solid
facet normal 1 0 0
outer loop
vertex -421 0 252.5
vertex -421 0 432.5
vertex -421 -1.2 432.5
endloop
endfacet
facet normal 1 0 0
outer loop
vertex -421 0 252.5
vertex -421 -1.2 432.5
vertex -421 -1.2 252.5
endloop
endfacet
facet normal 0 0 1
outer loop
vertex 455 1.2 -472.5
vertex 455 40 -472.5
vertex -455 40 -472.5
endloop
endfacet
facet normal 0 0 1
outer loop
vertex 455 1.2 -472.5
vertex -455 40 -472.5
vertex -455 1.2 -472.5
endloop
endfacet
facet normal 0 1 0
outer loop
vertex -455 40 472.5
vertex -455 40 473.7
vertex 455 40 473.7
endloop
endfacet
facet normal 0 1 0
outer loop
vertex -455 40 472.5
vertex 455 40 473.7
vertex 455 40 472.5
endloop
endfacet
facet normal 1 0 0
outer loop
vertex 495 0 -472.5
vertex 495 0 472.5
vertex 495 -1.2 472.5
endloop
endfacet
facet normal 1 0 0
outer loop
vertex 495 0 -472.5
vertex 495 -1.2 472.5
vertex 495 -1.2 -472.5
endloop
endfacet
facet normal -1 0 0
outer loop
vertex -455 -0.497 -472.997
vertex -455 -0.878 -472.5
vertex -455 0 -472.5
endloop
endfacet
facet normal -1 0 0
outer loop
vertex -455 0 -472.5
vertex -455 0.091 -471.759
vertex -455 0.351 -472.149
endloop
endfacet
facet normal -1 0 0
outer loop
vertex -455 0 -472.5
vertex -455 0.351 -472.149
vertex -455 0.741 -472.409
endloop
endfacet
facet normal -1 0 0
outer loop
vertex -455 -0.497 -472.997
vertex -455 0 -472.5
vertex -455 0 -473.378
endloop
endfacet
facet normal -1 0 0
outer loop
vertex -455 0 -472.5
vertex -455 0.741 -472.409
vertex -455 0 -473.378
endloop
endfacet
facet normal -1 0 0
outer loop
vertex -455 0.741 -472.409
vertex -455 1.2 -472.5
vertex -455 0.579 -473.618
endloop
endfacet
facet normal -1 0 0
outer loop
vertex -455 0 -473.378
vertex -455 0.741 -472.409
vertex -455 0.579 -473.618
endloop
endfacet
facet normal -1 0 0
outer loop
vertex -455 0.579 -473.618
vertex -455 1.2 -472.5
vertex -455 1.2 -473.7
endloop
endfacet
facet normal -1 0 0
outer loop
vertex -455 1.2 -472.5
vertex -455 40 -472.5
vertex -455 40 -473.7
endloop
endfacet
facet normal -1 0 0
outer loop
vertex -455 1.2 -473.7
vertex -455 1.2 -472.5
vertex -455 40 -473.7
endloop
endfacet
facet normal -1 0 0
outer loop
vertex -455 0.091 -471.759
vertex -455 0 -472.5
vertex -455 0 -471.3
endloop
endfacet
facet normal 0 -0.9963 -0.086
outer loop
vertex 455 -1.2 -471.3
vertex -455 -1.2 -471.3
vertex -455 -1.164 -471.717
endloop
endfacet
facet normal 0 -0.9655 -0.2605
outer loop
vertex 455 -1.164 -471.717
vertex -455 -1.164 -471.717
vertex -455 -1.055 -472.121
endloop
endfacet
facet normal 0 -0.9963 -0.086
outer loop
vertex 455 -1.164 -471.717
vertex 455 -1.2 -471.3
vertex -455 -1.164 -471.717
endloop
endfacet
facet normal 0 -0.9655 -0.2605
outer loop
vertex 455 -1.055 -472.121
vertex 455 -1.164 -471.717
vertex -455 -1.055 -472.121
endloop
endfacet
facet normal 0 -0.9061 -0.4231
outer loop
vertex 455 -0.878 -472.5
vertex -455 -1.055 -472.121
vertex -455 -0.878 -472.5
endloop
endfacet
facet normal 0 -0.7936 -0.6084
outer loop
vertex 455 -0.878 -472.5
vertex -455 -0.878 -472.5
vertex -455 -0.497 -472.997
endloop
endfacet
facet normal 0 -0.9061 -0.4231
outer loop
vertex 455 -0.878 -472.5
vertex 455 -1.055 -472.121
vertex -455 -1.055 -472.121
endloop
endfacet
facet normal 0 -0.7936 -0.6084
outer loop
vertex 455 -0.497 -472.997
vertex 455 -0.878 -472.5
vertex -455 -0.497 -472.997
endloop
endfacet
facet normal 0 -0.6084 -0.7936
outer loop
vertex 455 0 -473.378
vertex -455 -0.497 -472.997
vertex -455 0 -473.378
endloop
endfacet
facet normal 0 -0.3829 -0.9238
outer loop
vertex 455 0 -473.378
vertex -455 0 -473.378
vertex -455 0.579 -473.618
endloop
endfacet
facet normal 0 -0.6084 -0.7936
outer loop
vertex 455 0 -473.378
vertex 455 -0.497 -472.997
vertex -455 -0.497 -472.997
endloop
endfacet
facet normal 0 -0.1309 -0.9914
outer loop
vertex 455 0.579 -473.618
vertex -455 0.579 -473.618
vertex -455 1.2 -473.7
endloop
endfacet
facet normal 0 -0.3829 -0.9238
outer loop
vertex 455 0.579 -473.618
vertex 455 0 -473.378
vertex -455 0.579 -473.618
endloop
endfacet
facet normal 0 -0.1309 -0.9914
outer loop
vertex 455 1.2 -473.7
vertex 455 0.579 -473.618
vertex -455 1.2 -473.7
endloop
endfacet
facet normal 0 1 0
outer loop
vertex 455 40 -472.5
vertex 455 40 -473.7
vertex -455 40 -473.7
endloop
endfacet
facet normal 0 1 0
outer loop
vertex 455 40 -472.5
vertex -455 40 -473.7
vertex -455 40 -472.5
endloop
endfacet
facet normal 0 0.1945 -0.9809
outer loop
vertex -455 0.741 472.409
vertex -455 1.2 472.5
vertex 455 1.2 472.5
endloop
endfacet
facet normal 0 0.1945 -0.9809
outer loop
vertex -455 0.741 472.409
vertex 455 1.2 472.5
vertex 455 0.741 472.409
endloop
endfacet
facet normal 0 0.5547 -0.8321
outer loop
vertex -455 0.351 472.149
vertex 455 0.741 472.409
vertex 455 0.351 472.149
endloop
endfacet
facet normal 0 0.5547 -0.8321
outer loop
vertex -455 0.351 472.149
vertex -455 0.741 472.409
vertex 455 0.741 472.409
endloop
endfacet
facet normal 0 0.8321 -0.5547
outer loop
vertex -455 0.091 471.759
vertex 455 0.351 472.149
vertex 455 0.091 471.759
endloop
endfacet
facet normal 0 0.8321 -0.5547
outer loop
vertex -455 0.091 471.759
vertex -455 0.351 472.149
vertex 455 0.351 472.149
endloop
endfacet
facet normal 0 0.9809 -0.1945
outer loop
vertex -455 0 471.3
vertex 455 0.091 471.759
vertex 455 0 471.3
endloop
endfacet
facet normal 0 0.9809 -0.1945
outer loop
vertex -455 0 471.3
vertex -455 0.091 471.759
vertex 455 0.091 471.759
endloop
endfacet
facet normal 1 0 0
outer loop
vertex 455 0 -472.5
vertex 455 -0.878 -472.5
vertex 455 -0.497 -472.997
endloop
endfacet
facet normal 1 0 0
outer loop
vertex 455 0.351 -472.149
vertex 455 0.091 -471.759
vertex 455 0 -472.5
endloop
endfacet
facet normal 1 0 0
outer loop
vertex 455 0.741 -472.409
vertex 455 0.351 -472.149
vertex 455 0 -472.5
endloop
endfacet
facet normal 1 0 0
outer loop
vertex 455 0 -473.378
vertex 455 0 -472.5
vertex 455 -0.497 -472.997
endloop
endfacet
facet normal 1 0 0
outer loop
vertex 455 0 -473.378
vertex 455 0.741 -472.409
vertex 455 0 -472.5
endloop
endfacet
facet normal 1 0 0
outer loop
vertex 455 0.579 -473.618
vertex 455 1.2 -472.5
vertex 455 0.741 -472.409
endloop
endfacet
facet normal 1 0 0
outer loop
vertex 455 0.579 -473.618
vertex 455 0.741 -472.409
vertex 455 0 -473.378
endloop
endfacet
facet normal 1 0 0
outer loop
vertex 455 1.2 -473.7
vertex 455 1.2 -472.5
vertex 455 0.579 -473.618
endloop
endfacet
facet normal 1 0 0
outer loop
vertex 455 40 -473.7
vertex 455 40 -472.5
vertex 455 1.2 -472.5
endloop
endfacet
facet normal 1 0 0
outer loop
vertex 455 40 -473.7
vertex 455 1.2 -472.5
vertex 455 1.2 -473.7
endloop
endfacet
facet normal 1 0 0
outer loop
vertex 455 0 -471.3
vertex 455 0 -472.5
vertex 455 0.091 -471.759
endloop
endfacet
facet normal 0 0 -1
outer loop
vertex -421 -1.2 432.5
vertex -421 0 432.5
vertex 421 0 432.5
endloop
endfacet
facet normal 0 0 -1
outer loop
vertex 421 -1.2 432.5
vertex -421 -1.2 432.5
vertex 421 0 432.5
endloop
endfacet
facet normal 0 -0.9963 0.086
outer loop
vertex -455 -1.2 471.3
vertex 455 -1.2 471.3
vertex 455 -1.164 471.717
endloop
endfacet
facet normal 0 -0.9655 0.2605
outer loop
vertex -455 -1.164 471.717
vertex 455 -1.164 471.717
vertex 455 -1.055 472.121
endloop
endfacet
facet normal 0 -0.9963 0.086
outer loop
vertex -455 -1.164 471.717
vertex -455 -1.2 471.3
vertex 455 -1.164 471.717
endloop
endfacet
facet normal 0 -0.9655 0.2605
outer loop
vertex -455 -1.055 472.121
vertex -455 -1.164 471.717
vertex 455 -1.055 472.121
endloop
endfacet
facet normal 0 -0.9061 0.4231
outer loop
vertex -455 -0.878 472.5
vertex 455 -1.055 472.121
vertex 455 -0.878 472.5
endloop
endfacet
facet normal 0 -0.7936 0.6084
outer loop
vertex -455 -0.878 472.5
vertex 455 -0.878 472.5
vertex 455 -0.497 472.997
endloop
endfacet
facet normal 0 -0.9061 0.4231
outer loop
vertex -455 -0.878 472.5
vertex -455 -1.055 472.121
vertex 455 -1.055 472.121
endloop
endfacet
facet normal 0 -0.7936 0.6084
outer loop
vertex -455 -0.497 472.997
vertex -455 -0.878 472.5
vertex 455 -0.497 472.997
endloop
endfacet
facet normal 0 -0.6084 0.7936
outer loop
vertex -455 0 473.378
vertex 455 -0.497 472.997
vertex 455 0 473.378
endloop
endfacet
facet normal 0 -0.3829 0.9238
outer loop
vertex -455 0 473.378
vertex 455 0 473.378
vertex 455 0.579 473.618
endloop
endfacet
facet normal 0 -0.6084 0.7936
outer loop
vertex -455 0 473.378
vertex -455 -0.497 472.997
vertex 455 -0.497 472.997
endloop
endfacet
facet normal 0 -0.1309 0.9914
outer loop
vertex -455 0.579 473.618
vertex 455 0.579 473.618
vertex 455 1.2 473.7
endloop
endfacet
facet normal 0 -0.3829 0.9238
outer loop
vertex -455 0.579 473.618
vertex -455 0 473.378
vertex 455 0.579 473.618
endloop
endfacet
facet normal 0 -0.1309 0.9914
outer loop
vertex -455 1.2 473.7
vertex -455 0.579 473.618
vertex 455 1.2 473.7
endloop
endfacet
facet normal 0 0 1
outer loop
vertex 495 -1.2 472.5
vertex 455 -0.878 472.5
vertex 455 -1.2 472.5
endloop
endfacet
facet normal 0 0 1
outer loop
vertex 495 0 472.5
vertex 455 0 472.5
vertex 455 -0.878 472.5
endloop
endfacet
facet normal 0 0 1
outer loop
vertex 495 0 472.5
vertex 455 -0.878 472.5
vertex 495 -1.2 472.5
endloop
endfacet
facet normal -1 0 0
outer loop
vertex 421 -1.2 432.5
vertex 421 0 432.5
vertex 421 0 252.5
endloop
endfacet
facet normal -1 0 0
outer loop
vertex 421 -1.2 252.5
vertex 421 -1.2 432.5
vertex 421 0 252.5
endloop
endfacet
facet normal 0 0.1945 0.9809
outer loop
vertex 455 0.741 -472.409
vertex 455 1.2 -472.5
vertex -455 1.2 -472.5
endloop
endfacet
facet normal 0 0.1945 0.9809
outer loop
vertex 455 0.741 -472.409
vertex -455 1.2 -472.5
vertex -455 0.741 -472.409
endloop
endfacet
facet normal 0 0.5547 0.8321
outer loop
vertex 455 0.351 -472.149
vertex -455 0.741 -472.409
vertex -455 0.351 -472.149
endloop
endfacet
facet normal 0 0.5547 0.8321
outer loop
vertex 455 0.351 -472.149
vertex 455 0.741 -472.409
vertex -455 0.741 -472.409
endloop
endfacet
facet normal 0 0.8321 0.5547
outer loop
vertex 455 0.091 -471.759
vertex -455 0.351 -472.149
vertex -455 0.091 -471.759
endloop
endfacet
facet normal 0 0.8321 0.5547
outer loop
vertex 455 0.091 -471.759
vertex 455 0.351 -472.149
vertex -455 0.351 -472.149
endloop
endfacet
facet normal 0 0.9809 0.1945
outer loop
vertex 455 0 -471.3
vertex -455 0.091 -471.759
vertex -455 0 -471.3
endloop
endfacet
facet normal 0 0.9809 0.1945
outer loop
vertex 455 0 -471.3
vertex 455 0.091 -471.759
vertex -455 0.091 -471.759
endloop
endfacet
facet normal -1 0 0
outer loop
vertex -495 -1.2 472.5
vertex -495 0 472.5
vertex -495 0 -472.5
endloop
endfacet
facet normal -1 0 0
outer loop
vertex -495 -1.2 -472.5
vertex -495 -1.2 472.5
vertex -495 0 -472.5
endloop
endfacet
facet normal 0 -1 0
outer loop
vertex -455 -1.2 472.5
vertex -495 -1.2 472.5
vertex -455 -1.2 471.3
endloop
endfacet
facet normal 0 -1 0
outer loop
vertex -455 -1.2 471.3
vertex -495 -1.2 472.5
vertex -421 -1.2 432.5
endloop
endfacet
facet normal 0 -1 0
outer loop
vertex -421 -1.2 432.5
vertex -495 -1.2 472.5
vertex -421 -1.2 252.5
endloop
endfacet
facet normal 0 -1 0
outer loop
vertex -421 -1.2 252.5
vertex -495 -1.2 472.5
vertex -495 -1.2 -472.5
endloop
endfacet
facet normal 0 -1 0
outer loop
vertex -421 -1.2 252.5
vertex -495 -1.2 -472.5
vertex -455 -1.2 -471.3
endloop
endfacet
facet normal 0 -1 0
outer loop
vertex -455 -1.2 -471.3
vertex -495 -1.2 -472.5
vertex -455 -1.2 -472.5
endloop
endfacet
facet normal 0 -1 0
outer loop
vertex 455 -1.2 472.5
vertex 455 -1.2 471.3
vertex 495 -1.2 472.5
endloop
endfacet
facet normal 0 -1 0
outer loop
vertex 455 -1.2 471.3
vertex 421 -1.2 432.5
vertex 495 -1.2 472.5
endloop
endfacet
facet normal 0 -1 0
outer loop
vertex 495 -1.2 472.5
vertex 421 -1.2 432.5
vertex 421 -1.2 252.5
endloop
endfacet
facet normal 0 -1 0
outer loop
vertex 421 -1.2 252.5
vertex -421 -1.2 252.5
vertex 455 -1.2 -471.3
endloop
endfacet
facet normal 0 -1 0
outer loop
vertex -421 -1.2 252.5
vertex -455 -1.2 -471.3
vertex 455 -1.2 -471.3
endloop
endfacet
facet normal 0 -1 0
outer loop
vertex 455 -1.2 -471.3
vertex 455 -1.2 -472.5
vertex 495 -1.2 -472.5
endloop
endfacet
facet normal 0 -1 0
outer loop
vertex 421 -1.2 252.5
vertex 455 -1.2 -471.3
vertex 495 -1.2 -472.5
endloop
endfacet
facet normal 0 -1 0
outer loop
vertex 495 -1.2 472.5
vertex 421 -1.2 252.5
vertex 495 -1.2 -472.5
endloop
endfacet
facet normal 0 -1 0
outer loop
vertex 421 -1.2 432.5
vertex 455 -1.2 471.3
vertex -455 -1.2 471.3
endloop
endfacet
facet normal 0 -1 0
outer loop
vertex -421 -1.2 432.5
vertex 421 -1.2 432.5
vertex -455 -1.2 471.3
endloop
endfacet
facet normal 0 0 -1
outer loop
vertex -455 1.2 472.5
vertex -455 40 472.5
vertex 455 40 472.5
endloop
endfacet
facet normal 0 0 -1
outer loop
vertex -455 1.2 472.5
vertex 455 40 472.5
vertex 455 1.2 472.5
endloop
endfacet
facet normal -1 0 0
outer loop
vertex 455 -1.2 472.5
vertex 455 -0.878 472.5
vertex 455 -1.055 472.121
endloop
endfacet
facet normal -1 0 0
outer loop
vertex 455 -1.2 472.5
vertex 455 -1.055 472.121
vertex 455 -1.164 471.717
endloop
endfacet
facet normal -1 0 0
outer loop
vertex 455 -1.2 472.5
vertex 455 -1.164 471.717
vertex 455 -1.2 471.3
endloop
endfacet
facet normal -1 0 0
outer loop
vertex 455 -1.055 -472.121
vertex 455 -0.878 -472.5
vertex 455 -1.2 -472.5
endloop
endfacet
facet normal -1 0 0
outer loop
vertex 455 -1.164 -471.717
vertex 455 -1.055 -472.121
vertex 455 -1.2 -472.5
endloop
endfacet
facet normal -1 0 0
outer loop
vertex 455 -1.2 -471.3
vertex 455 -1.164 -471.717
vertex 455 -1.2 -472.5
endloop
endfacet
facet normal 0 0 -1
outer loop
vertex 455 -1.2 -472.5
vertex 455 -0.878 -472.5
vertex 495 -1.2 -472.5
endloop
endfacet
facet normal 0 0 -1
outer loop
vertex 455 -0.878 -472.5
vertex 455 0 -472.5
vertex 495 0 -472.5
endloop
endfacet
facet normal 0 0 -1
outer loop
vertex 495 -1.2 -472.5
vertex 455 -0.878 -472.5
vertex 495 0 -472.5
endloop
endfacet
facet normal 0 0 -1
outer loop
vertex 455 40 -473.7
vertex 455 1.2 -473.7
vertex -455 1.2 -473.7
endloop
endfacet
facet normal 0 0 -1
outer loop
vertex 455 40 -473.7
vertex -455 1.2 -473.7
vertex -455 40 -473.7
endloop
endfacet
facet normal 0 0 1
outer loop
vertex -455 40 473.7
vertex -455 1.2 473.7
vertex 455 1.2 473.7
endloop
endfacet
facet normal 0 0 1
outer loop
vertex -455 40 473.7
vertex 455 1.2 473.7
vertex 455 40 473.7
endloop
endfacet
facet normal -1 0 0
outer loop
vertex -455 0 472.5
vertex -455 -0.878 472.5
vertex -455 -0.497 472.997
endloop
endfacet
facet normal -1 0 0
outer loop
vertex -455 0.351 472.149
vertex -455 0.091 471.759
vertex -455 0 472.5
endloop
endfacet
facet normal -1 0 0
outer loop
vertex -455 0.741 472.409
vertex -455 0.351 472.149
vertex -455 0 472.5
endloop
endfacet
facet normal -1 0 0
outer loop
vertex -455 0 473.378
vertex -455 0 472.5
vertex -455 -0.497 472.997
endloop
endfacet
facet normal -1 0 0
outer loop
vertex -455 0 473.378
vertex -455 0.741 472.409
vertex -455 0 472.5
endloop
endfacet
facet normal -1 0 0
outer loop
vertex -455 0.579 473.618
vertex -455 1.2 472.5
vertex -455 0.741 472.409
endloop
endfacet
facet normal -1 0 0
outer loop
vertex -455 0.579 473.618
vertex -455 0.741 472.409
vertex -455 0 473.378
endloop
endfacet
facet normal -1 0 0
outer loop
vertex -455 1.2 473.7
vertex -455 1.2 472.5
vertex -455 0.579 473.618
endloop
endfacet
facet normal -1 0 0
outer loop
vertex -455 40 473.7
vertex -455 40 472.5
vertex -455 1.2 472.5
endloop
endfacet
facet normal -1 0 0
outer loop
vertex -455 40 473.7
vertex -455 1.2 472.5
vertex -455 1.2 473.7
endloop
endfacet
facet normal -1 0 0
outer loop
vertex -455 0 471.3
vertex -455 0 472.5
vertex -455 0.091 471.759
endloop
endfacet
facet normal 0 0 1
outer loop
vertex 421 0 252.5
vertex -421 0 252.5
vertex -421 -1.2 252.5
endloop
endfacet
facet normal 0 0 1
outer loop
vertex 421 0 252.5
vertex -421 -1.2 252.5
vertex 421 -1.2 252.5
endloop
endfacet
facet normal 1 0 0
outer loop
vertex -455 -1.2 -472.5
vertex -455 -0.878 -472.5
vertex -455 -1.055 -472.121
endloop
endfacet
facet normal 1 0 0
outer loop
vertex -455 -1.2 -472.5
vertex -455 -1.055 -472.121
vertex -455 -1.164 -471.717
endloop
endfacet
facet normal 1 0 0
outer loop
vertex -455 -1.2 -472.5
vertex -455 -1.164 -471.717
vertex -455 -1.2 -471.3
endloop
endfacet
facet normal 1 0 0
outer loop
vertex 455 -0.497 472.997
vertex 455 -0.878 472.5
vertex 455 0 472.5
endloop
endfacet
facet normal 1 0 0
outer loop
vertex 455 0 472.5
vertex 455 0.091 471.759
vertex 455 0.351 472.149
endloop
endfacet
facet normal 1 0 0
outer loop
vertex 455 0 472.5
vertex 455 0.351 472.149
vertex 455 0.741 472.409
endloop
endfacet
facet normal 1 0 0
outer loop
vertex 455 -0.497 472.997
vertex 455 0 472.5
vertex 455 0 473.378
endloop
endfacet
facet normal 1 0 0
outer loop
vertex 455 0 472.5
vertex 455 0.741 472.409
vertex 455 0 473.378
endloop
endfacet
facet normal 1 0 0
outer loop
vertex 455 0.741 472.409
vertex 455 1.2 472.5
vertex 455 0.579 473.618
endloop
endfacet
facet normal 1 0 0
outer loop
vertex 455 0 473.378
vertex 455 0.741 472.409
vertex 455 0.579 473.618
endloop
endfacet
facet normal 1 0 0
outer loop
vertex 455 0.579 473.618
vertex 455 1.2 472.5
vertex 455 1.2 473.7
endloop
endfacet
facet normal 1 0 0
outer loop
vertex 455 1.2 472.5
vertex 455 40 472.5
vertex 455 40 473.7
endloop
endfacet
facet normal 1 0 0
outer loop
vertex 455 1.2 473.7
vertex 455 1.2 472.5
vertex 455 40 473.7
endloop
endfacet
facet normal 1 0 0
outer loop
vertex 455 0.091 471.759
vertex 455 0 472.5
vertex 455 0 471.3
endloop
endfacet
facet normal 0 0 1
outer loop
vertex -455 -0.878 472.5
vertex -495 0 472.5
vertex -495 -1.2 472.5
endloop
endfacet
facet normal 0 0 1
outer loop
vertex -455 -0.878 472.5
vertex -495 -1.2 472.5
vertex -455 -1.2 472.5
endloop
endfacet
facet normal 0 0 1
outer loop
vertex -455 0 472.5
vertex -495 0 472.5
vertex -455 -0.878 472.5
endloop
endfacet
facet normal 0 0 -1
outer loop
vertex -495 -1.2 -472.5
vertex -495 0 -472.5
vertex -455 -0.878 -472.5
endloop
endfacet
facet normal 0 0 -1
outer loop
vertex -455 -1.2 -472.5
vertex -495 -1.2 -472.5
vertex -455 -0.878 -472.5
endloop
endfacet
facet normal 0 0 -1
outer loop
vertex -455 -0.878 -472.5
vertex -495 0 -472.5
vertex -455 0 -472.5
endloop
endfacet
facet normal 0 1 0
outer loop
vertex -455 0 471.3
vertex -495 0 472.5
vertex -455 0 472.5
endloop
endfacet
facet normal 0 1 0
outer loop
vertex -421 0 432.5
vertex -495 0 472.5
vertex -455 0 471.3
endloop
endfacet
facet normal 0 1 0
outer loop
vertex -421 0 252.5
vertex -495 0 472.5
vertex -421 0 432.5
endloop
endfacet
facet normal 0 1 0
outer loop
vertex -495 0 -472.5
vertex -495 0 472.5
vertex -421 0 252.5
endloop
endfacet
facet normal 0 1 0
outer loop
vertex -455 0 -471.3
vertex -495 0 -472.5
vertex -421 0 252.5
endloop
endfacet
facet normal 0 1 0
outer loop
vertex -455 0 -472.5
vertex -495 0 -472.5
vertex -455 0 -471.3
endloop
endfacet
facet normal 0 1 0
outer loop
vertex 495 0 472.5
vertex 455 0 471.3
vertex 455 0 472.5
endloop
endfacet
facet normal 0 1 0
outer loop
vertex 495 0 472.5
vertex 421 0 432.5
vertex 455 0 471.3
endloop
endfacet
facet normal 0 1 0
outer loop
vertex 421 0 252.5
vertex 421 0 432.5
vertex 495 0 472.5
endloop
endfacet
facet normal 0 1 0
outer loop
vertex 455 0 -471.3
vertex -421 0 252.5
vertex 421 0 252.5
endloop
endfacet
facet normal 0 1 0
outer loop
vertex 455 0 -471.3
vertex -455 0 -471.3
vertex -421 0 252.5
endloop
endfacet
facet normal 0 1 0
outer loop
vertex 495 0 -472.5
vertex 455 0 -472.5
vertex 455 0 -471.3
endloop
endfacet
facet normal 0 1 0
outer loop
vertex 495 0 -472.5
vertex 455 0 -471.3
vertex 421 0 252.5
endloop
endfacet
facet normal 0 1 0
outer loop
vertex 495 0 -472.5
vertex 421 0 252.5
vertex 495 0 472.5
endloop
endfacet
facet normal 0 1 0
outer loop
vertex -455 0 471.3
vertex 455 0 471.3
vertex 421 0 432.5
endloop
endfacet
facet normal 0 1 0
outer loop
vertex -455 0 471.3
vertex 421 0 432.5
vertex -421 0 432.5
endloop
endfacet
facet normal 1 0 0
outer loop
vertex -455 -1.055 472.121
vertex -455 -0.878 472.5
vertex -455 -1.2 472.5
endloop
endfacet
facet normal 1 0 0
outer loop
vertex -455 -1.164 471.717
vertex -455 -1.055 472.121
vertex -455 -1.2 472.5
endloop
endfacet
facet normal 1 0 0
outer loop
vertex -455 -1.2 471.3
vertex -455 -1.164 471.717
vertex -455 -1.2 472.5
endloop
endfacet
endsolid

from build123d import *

# Parameters (mm, degrees)
SKETCH1_W                    = 990
SKETCH1_H                    = 945
SKETCH1_W_2                  = 842
SKETCH1_H_2                  = 180
BASE_FLANGE1_DEPTH           = 1.2
EDGE_FLANGE1_STRIP_W         = 7.2
EDGE_FLANGE1_STRIP_H         = 1.2
EDGE_FLANGE1_STRIP_CUT_DEPTH = 910
EDGE_FLANGE1_DEPTH           = 910
EDGE_FLANGE2_STRIP_W         = 7.2
EDGE_FLANGE2_STRIP_H         = 1.2
EDGE_FLANGE2_STRIP_CUT_DEPTH = 910
EDGE_FLANGE2_DEPTH           = 910


# Sheet-metal steps are written as plain solids
with BuildPart() as part:
    # Sketch1 → Base-Flange1 (new body)
    with BuildSketch(Plane(origin=(0, 0, 0), x_dir=(1, 0, 0), z_dir=(0, 1, 0))):
        Rectangle(SKETCH1_W, SKETCH1_H)
        with Locations((0, -342.5)):
            Rectangle(SKETCH1_W_2, SKETCH1_H_2, mode=Mode.SUBTRACT)
    extrude(amount=-BASE_FLANGE1_DEPTH)

    # Edge-Flange1 strip (across the edge) → Edge-Flange1 strip cut (cut)
    with BuildSketch(Plane(origin=(455, 0, -472.5), x_dir=(0, 0, 1), z_dir=(-1, 0, 0))):
        with Locations((-2.4, -0.6)):
            Rectangle(EDGE_FLANGE1_STRIP_W, EDGE_FLANGE1_STRIP_H)
    extrude(amount=EDGE_FLANGE1_STRIP_CUT_DEPTH, mode=Mode.SUBTRACT)

    # Edge-Flange1 section (across the edge) → Edge-Flange1 (add)
    with BuildSketch(Plane(origin=(455, 0, -472.5), x_dir=(0, 0, 1), z_dir=(-1, 0, 0))):
        with BuildLine():
            Line((-1.2, 1.2), (-1.2, 40))
            Line((-1.2, 40), (0, 40))
            Line((0, 40), (0, 1.2))
            ThreePointArc((0, 1.2), (0.351471863, 0.351471863), (1.2, 0))
            Line((1.2, 0), (1.2, -1.2))
            ThreePointArc((1.2, -1.2), (-0.497056275, -0.497056275), (-1.2, 1.2))
        make_face()
    extrude(amount=EDGE_FLANGE1_DEPTH)

    # Edge-Flange2 strip (across the edge) → Edge-Flange2 strip cut (cut)
    with BuildSketch(Plane(origin=(-455, 0, 472.5), x_dir=(0, 0, -1), z_dir=(1, 0, 0))):
        with Locations((-2.4, -0.6)):
            Rectangle(EDGE_FLANGE2_STRIP_W, EDGE_FLANGE2_STRIP_H)
    extrude(amount=EDGE_FLANGE2_STRIP_CUT_DEPTH, mode=Mode.SUBTRACT)

    # Edge-Flange2 section (across the edge) → Edge-Flange2 (add)
    with BuildSketch(Plane(origin=(-455, 0, 472.5), x_dir=(0, 0, -1), z_dir=(1, 0, 0))):
        with BuildLine():
            Line((-1.2, 1.2), (-1.2, 40))
            Line((-1.2, 40), (0, 40))
            Line((0, 40), (0, 1.2))
            ThreePointArc((0, 1.2), (0.351471863, 0.351471863), (1.2, 0))
            Line((1.2, 0), (1.2, -1.2))
            ThreePointArc((1.2, -1.2), (-0.497056275, -0.497056275), (-1.2, 1.2))
        make_face()
    extrude(amount=EDGE_FLANGE2_DEPTH)


solid = part.part
